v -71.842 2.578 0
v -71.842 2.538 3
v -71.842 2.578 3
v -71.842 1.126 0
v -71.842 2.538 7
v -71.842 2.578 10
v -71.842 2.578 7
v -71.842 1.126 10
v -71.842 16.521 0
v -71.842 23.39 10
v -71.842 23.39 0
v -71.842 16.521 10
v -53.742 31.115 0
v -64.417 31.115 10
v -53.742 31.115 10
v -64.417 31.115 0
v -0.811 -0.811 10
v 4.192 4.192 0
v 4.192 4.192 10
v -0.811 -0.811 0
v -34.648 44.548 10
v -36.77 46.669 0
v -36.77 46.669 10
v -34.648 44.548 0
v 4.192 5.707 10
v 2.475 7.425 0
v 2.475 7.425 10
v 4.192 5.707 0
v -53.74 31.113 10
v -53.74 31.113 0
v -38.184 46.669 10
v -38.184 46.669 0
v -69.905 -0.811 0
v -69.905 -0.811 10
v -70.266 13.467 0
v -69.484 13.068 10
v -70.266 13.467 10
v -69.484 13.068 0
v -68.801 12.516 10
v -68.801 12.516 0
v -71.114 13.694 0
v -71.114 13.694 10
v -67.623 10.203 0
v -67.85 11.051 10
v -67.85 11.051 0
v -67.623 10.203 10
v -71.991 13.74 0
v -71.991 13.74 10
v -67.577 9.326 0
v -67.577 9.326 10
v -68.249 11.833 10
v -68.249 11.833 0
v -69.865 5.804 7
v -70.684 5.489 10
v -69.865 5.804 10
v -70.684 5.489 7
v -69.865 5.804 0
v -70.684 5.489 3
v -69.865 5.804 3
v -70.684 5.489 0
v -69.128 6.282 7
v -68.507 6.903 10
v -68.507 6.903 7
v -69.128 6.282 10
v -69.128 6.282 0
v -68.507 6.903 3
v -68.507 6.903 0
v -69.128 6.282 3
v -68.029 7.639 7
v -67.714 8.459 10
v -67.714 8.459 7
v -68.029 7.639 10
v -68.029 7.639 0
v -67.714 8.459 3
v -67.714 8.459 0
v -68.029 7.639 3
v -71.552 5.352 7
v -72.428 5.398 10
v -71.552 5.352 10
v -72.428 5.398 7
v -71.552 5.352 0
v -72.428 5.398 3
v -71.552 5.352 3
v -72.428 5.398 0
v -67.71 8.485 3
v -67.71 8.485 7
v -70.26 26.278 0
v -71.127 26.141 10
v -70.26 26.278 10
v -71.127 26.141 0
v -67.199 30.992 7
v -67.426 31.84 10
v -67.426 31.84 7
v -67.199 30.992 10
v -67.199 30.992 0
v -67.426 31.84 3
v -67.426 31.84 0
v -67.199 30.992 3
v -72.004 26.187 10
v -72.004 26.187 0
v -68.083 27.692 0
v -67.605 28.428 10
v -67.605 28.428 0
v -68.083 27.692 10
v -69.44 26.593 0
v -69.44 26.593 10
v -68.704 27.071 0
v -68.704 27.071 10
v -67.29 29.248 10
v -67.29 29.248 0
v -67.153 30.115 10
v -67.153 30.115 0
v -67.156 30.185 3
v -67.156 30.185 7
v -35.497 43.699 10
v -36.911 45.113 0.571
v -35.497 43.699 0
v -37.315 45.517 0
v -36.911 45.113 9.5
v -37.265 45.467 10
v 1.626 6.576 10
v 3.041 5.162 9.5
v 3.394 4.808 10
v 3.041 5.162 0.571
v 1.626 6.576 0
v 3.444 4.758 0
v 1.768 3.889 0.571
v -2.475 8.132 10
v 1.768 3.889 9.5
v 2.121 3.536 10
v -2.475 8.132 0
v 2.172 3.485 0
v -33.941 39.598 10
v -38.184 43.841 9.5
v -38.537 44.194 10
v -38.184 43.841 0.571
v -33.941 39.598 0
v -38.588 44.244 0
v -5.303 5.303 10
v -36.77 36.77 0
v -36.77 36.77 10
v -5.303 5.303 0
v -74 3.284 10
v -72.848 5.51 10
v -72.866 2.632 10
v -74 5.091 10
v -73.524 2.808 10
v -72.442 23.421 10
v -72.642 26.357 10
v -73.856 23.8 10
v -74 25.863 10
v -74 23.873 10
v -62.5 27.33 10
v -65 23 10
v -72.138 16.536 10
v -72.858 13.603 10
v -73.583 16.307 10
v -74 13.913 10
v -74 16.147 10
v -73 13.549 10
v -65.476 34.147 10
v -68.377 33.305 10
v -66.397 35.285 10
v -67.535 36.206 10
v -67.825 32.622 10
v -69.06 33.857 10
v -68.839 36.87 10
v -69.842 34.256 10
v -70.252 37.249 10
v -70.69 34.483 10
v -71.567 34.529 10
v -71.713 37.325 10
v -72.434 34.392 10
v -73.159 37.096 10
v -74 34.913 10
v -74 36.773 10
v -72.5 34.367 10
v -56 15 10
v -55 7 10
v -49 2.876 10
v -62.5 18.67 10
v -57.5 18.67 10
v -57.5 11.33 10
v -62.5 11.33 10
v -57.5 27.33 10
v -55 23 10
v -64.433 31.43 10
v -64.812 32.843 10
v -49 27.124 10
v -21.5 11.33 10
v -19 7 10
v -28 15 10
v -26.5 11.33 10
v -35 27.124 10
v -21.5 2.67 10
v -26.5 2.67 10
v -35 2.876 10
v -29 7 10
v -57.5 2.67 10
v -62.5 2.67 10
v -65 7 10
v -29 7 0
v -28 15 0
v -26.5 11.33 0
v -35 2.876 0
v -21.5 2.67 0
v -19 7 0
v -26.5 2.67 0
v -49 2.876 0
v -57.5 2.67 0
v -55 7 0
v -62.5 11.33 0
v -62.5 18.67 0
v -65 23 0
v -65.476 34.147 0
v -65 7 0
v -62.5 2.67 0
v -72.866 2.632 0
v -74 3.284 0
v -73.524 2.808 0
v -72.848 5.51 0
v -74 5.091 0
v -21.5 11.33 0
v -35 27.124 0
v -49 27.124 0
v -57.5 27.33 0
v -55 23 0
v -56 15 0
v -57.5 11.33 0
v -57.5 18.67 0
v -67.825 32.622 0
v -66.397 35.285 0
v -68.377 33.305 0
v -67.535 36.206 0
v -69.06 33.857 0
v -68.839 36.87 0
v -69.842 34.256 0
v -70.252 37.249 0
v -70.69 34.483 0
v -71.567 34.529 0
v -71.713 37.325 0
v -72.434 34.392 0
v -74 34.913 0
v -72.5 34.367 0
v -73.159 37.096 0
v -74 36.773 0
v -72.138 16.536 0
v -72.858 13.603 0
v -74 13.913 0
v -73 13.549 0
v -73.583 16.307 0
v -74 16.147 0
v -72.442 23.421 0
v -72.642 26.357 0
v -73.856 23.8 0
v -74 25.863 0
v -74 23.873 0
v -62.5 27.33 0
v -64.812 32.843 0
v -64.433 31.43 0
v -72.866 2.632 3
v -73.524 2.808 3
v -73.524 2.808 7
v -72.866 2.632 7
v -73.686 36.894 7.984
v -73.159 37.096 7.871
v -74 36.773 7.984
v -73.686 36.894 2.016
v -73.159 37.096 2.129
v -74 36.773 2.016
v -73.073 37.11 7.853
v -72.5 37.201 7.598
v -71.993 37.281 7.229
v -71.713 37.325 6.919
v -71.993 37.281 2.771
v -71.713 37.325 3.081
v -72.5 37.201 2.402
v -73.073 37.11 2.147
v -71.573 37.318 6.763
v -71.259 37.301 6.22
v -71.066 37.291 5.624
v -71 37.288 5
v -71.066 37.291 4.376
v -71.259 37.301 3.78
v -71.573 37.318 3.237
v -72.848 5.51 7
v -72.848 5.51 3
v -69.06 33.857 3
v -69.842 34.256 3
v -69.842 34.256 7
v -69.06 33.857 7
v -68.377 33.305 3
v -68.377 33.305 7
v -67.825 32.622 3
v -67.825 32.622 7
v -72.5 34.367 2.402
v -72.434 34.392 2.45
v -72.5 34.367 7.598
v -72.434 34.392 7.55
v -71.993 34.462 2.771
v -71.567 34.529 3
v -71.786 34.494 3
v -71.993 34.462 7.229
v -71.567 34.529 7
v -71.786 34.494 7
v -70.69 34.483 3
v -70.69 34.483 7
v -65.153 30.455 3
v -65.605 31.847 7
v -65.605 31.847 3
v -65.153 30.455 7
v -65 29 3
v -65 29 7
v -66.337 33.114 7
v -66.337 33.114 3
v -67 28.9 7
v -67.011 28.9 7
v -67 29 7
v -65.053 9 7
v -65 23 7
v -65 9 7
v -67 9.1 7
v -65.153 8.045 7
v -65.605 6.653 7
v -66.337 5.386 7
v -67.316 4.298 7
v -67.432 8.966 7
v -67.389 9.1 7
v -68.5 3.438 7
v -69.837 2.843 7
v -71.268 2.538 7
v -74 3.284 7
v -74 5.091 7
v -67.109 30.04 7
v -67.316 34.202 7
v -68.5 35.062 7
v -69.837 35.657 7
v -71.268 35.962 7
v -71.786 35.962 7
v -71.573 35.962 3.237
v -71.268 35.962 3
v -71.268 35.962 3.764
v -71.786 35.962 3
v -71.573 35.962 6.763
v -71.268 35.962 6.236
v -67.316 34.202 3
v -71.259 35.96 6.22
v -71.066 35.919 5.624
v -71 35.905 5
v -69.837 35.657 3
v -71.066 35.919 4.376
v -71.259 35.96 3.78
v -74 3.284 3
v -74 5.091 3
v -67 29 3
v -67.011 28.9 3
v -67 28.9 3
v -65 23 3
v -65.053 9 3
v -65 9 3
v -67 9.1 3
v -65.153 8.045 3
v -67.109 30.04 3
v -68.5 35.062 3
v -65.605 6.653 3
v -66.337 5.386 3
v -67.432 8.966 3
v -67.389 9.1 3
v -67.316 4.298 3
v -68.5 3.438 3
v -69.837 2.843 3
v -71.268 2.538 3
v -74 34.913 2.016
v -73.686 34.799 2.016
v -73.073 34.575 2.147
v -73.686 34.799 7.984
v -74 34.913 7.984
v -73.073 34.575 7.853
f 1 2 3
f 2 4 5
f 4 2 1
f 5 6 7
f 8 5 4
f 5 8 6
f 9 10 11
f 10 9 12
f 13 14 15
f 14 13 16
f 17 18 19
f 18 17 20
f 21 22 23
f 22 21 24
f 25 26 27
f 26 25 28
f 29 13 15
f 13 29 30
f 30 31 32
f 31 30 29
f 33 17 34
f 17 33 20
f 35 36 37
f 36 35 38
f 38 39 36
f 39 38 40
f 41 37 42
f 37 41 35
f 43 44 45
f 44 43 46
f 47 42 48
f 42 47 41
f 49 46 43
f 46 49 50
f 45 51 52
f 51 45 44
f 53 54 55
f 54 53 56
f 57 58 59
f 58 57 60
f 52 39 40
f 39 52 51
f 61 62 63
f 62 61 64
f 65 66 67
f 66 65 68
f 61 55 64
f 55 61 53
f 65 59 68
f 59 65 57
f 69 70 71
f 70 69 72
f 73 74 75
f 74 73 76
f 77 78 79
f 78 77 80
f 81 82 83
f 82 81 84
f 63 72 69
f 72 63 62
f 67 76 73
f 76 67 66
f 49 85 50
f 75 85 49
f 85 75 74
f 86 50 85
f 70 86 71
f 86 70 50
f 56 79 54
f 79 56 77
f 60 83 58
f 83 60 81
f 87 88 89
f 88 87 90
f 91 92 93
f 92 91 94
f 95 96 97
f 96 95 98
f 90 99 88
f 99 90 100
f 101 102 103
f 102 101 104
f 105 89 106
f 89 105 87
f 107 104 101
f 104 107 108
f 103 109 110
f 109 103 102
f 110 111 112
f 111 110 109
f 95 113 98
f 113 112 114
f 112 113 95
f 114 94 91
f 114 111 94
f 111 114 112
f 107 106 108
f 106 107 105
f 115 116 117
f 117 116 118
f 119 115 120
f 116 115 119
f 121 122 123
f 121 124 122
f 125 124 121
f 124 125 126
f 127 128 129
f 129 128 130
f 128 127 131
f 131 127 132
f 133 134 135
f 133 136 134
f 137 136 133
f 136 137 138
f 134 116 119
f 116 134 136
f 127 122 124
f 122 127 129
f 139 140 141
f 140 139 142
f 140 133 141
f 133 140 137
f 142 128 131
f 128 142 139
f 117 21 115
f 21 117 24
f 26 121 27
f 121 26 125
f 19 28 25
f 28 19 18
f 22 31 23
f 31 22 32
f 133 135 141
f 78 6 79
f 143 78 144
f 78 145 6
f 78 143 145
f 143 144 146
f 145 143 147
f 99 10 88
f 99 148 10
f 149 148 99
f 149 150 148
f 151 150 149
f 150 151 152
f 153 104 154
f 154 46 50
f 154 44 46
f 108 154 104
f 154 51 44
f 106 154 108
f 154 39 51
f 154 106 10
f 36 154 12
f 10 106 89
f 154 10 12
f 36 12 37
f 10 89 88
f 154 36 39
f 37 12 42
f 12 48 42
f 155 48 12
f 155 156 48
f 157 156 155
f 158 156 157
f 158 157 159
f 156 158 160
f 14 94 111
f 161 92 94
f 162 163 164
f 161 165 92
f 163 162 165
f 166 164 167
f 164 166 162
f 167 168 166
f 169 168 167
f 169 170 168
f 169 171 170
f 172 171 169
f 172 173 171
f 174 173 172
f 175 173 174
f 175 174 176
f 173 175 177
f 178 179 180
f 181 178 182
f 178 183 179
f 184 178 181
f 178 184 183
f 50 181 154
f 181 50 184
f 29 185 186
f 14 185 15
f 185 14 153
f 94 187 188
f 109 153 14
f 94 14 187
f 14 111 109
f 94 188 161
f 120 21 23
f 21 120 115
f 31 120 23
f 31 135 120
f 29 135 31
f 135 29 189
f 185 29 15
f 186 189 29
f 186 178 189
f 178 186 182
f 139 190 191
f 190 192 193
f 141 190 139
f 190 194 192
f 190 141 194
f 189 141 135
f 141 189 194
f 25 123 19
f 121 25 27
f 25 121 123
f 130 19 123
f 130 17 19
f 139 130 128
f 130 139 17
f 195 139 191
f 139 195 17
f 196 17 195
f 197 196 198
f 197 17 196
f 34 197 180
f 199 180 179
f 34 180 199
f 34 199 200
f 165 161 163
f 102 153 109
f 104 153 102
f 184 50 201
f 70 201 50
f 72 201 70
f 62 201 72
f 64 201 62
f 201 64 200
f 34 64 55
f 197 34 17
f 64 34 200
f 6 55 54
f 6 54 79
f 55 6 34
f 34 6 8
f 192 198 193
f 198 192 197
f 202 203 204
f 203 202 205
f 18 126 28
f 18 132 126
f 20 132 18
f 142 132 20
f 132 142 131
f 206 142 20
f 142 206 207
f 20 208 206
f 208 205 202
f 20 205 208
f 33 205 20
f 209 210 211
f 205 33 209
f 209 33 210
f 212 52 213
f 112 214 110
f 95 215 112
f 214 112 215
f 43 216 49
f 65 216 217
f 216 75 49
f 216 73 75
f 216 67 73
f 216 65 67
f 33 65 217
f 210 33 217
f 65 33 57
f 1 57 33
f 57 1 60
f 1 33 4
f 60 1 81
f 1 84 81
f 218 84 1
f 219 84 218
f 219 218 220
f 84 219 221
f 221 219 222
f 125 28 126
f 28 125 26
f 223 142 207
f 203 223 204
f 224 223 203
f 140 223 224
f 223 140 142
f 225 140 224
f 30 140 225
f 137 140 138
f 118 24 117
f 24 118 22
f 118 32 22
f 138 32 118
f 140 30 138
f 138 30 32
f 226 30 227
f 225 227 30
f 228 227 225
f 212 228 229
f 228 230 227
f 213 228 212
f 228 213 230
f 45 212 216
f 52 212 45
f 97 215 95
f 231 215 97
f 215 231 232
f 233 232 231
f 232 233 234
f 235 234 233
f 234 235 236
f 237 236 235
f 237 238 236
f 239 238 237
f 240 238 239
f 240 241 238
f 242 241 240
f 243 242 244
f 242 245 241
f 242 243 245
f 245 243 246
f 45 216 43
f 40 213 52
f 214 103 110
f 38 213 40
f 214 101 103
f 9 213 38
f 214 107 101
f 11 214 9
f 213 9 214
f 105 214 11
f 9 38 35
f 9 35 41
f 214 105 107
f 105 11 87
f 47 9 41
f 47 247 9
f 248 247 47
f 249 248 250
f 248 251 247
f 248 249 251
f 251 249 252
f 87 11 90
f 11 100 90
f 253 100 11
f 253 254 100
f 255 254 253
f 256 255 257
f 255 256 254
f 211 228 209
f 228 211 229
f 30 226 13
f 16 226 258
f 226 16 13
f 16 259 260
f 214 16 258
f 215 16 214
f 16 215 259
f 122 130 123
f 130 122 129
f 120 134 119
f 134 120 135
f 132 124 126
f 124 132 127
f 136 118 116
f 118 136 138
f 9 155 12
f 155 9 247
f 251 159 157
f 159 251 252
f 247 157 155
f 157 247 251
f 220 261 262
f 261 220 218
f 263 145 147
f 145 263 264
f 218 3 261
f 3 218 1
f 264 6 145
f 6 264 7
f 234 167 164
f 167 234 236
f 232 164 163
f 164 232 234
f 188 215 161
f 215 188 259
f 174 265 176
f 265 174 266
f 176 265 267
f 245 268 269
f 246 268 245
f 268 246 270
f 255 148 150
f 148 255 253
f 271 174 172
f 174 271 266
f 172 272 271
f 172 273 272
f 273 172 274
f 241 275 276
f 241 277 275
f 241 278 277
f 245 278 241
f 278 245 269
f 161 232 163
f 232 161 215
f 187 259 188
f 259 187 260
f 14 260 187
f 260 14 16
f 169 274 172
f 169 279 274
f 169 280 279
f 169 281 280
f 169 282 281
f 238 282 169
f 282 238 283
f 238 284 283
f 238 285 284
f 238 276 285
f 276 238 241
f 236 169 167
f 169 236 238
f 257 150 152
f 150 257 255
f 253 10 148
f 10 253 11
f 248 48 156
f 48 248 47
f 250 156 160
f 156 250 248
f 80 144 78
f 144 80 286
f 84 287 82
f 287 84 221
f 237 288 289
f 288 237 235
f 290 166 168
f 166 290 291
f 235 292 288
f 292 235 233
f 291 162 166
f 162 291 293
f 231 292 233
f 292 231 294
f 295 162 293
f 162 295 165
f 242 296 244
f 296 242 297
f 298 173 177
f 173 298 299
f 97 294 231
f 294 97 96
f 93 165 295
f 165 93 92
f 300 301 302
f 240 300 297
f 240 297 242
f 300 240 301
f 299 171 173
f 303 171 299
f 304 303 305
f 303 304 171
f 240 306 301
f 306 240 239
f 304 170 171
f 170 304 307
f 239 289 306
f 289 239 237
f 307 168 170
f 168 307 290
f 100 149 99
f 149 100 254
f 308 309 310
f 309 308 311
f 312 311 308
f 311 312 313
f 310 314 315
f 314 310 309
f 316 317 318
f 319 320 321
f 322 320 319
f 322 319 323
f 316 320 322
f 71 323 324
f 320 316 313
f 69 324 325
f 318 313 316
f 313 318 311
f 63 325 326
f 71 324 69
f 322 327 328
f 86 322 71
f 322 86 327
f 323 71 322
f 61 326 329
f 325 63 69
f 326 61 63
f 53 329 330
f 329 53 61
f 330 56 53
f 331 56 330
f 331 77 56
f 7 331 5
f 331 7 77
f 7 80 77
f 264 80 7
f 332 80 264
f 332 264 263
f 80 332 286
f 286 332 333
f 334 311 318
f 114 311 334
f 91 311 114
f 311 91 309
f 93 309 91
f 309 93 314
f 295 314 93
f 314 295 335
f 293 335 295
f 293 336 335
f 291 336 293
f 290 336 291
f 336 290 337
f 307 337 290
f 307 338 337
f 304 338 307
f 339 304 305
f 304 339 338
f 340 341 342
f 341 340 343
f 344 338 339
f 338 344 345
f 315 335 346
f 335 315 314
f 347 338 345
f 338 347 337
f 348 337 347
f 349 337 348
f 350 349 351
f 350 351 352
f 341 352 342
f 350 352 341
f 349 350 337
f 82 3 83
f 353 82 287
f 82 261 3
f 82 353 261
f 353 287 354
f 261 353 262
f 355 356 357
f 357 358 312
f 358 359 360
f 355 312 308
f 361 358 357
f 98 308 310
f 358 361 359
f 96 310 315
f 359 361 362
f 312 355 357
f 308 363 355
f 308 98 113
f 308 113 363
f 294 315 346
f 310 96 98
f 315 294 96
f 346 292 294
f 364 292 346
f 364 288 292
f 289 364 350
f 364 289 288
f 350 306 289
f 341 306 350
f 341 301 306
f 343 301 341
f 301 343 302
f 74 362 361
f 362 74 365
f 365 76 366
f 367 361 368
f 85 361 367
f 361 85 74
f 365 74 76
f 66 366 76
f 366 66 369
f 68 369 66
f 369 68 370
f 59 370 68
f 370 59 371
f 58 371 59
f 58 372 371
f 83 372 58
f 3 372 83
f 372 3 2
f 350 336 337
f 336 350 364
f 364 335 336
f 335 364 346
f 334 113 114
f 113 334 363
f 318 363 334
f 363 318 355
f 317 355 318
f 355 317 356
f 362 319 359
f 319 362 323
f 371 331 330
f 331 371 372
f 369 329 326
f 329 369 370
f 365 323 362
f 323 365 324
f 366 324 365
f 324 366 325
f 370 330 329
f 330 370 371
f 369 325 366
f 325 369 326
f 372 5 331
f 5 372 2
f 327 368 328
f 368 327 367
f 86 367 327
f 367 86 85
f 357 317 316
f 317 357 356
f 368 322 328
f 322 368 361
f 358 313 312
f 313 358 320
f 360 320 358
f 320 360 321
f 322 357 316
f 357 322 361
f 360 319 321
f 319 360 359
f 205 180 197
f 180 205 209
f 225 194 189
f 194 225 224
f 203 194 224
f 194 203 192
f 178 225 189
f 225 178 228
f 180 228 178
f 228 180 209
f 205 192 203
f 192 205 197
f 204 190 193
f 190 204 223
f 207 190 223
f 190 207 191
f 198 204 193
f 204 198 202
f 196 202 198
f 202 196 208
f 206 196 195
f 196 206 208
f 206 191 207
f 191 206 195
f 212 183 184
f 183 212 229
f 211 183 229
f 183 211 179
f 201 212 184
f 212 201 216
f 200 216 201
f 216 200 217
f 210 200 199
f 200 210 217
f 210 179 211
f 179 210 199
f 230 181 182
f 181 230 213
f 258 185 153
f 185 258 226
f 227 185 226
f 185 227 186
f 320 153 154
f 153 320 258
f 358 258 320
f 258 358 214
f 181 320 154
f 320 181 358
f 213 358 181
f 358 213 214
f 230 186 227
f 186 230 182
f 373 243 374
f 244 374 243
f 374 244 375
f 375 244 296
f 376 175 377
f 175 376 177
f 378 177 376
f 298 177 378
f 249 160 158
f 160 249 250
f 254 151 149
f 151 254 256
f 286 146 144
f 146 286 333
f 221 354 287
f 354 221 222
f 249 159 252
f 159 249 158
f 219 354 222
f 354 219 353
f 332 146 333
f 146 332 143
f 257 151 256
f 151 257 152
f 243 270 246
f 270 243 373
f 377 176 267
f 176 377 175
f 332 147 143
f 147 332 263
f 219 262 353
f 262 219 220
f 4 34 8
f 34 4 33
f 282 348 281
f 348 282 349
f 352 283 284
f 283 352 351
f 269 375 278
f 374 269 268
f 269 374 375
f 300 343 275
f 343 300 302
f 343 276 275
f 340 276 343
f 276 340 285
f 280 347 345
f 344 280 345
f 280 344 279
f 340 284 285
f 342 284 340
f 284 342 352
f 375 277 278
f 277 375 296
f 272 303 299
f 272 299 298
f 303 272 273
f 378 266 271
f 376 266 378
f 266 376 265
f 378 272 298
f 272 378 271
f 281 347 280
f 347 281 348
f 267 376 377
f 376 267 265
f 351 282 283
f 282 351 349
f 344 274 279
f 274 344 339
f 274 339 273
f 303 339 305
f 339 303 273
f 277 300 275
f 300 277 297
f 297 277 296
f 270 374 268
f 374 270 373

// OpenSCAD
// PRUS Aiteration3
// lcd-support-A
// GNU GPLv3
// Josef Průša <iam@josefprusa.cz> and contributors
// http://www.reprap.org/wiki/Prusa_Mendel
// http://prusamendel.org

module body(){
    difference(){
        translate([-55,-2,0]) cube([69,81,10]);
        union(){
            // outer body shape
            translate([-69.6,32,-1]) rotate([0,0,45]) cube([60,53,15]);
            translate([13.7,89.7,-1]) rotate([0,0,135]) cube([60,42,15]);
            translate([-19,-9,-1]) cube([60,9,15]);
            translate([7,-3,-1]) cube([60,68,16]);
            translate([-16,60,-1]) cube([60,50,15]);
            translate([-41,-45,-1]) rotate([0,0,45]) cube([60,80,13]);

            // threaded rods opening
            translate([-44,57.5,-1]) cylinder(h=17,r=4.2,$fn=30);
            translate([-29,71.9,-1]) cylinder(h=17,r=4.2,$fn=30);

            // pcb cout out
            translate([4,1.5,-1]) cube([1.8,56.5,17]);
            translate([0,7.5,-1]) cube([5.8,44.5,17]);
            translate([4.8,3.5,-1]) cube([5.8,52.5,17]);

            translate([8,-5,-1]) rotate([0,0,45]) cube([5,5,17]);
            translate([8,58,-1]) rotate([0,0,45]) cube([5,5,17]);
        }

        // pcb inserts
        translate([4,3,8]) rotate([45,0,0]) cube([1.8,5,5]);
        translate([4,56.5,8]) rotate([45,0,0]) cube([1.8,5,5]);
        translate([4,3,-5]) rotate([45,0,0]) cube([1.8,5,5]);
        translate([4,56.5,-5]) rotate([45,0,0]) cube([1.8,5,5]);

    }

    difference(){
        union(){
            translate([-44,57.5,0]) cylinder(h=10,r=7,$fn=30);
            translate([-29,71.9,0]) cylinder(h=10,r=7,$fn=30);
        }
        translate([-44,57.5,-1]) cylinder(h=17,r=4.2,$fn=30);
        translate([-29,71.9,-1]) cylinder(h=17,r=4.2,$fn=30);
    }
}

module ziptie(){
    difference(){
        union(){
            difference(){
                translate([-72,29,3]) cylinder(h=4,r=7,$fn=30);
                translate([-72,29,3]) cylinder(h=4,r=5,$fn=30);
            }
            difference(){
                translate([-72,9.5,3]) cylinder(h=4,r=7,$fn=30);
                translate([-72,11,3]) cylinder(h=4,r=5,$fn=30);
            }
        }
        translate([-80,9.1,3]) cube([15,19.8,4]);
    }
    translate([-67,9,3]) cube([2,20,4]);
}

difference(){
    rotate([0,0,45]) body();

    // light ening holes
    translate([-42,15,-1]) cylinder(h=15,r=14,$fn=6);
    translate([-24,7,-1]) cylinder(h=15,r=5,$fn=6);
    translate([-60,7,-1]) cylinder(h=15,r=5,$fn=6);
    translate([-60,23,-1]) cylinder(h=15,r=5,$fn=6);

    //threadedrodscorners
    translate([-71,28.5,-1]) rotate([0,0,70]) cube([5,10,15]);
    translate([-71,7.5,-1]) rotate([0,0,70]) cube([5,10,15]);
    translate([-80,29,-1]) rotate([0,0,-70]) cube([5,10,15]);
    translate([-82,7.5,-1]) rotate([0,0,-70]) cube([5,10,15]);
    translate([-86,0,-1]) cube([12,50,15]);
    translate([-83,-16,-1]) rotate([0,0,45]) cube([20,20,15]);

    ziptie();

    // zip tie headcut out
    translate([-74,38,5]) rotate([90,0,0]) cylinder(h=5,r=3,$fn=30);
}
